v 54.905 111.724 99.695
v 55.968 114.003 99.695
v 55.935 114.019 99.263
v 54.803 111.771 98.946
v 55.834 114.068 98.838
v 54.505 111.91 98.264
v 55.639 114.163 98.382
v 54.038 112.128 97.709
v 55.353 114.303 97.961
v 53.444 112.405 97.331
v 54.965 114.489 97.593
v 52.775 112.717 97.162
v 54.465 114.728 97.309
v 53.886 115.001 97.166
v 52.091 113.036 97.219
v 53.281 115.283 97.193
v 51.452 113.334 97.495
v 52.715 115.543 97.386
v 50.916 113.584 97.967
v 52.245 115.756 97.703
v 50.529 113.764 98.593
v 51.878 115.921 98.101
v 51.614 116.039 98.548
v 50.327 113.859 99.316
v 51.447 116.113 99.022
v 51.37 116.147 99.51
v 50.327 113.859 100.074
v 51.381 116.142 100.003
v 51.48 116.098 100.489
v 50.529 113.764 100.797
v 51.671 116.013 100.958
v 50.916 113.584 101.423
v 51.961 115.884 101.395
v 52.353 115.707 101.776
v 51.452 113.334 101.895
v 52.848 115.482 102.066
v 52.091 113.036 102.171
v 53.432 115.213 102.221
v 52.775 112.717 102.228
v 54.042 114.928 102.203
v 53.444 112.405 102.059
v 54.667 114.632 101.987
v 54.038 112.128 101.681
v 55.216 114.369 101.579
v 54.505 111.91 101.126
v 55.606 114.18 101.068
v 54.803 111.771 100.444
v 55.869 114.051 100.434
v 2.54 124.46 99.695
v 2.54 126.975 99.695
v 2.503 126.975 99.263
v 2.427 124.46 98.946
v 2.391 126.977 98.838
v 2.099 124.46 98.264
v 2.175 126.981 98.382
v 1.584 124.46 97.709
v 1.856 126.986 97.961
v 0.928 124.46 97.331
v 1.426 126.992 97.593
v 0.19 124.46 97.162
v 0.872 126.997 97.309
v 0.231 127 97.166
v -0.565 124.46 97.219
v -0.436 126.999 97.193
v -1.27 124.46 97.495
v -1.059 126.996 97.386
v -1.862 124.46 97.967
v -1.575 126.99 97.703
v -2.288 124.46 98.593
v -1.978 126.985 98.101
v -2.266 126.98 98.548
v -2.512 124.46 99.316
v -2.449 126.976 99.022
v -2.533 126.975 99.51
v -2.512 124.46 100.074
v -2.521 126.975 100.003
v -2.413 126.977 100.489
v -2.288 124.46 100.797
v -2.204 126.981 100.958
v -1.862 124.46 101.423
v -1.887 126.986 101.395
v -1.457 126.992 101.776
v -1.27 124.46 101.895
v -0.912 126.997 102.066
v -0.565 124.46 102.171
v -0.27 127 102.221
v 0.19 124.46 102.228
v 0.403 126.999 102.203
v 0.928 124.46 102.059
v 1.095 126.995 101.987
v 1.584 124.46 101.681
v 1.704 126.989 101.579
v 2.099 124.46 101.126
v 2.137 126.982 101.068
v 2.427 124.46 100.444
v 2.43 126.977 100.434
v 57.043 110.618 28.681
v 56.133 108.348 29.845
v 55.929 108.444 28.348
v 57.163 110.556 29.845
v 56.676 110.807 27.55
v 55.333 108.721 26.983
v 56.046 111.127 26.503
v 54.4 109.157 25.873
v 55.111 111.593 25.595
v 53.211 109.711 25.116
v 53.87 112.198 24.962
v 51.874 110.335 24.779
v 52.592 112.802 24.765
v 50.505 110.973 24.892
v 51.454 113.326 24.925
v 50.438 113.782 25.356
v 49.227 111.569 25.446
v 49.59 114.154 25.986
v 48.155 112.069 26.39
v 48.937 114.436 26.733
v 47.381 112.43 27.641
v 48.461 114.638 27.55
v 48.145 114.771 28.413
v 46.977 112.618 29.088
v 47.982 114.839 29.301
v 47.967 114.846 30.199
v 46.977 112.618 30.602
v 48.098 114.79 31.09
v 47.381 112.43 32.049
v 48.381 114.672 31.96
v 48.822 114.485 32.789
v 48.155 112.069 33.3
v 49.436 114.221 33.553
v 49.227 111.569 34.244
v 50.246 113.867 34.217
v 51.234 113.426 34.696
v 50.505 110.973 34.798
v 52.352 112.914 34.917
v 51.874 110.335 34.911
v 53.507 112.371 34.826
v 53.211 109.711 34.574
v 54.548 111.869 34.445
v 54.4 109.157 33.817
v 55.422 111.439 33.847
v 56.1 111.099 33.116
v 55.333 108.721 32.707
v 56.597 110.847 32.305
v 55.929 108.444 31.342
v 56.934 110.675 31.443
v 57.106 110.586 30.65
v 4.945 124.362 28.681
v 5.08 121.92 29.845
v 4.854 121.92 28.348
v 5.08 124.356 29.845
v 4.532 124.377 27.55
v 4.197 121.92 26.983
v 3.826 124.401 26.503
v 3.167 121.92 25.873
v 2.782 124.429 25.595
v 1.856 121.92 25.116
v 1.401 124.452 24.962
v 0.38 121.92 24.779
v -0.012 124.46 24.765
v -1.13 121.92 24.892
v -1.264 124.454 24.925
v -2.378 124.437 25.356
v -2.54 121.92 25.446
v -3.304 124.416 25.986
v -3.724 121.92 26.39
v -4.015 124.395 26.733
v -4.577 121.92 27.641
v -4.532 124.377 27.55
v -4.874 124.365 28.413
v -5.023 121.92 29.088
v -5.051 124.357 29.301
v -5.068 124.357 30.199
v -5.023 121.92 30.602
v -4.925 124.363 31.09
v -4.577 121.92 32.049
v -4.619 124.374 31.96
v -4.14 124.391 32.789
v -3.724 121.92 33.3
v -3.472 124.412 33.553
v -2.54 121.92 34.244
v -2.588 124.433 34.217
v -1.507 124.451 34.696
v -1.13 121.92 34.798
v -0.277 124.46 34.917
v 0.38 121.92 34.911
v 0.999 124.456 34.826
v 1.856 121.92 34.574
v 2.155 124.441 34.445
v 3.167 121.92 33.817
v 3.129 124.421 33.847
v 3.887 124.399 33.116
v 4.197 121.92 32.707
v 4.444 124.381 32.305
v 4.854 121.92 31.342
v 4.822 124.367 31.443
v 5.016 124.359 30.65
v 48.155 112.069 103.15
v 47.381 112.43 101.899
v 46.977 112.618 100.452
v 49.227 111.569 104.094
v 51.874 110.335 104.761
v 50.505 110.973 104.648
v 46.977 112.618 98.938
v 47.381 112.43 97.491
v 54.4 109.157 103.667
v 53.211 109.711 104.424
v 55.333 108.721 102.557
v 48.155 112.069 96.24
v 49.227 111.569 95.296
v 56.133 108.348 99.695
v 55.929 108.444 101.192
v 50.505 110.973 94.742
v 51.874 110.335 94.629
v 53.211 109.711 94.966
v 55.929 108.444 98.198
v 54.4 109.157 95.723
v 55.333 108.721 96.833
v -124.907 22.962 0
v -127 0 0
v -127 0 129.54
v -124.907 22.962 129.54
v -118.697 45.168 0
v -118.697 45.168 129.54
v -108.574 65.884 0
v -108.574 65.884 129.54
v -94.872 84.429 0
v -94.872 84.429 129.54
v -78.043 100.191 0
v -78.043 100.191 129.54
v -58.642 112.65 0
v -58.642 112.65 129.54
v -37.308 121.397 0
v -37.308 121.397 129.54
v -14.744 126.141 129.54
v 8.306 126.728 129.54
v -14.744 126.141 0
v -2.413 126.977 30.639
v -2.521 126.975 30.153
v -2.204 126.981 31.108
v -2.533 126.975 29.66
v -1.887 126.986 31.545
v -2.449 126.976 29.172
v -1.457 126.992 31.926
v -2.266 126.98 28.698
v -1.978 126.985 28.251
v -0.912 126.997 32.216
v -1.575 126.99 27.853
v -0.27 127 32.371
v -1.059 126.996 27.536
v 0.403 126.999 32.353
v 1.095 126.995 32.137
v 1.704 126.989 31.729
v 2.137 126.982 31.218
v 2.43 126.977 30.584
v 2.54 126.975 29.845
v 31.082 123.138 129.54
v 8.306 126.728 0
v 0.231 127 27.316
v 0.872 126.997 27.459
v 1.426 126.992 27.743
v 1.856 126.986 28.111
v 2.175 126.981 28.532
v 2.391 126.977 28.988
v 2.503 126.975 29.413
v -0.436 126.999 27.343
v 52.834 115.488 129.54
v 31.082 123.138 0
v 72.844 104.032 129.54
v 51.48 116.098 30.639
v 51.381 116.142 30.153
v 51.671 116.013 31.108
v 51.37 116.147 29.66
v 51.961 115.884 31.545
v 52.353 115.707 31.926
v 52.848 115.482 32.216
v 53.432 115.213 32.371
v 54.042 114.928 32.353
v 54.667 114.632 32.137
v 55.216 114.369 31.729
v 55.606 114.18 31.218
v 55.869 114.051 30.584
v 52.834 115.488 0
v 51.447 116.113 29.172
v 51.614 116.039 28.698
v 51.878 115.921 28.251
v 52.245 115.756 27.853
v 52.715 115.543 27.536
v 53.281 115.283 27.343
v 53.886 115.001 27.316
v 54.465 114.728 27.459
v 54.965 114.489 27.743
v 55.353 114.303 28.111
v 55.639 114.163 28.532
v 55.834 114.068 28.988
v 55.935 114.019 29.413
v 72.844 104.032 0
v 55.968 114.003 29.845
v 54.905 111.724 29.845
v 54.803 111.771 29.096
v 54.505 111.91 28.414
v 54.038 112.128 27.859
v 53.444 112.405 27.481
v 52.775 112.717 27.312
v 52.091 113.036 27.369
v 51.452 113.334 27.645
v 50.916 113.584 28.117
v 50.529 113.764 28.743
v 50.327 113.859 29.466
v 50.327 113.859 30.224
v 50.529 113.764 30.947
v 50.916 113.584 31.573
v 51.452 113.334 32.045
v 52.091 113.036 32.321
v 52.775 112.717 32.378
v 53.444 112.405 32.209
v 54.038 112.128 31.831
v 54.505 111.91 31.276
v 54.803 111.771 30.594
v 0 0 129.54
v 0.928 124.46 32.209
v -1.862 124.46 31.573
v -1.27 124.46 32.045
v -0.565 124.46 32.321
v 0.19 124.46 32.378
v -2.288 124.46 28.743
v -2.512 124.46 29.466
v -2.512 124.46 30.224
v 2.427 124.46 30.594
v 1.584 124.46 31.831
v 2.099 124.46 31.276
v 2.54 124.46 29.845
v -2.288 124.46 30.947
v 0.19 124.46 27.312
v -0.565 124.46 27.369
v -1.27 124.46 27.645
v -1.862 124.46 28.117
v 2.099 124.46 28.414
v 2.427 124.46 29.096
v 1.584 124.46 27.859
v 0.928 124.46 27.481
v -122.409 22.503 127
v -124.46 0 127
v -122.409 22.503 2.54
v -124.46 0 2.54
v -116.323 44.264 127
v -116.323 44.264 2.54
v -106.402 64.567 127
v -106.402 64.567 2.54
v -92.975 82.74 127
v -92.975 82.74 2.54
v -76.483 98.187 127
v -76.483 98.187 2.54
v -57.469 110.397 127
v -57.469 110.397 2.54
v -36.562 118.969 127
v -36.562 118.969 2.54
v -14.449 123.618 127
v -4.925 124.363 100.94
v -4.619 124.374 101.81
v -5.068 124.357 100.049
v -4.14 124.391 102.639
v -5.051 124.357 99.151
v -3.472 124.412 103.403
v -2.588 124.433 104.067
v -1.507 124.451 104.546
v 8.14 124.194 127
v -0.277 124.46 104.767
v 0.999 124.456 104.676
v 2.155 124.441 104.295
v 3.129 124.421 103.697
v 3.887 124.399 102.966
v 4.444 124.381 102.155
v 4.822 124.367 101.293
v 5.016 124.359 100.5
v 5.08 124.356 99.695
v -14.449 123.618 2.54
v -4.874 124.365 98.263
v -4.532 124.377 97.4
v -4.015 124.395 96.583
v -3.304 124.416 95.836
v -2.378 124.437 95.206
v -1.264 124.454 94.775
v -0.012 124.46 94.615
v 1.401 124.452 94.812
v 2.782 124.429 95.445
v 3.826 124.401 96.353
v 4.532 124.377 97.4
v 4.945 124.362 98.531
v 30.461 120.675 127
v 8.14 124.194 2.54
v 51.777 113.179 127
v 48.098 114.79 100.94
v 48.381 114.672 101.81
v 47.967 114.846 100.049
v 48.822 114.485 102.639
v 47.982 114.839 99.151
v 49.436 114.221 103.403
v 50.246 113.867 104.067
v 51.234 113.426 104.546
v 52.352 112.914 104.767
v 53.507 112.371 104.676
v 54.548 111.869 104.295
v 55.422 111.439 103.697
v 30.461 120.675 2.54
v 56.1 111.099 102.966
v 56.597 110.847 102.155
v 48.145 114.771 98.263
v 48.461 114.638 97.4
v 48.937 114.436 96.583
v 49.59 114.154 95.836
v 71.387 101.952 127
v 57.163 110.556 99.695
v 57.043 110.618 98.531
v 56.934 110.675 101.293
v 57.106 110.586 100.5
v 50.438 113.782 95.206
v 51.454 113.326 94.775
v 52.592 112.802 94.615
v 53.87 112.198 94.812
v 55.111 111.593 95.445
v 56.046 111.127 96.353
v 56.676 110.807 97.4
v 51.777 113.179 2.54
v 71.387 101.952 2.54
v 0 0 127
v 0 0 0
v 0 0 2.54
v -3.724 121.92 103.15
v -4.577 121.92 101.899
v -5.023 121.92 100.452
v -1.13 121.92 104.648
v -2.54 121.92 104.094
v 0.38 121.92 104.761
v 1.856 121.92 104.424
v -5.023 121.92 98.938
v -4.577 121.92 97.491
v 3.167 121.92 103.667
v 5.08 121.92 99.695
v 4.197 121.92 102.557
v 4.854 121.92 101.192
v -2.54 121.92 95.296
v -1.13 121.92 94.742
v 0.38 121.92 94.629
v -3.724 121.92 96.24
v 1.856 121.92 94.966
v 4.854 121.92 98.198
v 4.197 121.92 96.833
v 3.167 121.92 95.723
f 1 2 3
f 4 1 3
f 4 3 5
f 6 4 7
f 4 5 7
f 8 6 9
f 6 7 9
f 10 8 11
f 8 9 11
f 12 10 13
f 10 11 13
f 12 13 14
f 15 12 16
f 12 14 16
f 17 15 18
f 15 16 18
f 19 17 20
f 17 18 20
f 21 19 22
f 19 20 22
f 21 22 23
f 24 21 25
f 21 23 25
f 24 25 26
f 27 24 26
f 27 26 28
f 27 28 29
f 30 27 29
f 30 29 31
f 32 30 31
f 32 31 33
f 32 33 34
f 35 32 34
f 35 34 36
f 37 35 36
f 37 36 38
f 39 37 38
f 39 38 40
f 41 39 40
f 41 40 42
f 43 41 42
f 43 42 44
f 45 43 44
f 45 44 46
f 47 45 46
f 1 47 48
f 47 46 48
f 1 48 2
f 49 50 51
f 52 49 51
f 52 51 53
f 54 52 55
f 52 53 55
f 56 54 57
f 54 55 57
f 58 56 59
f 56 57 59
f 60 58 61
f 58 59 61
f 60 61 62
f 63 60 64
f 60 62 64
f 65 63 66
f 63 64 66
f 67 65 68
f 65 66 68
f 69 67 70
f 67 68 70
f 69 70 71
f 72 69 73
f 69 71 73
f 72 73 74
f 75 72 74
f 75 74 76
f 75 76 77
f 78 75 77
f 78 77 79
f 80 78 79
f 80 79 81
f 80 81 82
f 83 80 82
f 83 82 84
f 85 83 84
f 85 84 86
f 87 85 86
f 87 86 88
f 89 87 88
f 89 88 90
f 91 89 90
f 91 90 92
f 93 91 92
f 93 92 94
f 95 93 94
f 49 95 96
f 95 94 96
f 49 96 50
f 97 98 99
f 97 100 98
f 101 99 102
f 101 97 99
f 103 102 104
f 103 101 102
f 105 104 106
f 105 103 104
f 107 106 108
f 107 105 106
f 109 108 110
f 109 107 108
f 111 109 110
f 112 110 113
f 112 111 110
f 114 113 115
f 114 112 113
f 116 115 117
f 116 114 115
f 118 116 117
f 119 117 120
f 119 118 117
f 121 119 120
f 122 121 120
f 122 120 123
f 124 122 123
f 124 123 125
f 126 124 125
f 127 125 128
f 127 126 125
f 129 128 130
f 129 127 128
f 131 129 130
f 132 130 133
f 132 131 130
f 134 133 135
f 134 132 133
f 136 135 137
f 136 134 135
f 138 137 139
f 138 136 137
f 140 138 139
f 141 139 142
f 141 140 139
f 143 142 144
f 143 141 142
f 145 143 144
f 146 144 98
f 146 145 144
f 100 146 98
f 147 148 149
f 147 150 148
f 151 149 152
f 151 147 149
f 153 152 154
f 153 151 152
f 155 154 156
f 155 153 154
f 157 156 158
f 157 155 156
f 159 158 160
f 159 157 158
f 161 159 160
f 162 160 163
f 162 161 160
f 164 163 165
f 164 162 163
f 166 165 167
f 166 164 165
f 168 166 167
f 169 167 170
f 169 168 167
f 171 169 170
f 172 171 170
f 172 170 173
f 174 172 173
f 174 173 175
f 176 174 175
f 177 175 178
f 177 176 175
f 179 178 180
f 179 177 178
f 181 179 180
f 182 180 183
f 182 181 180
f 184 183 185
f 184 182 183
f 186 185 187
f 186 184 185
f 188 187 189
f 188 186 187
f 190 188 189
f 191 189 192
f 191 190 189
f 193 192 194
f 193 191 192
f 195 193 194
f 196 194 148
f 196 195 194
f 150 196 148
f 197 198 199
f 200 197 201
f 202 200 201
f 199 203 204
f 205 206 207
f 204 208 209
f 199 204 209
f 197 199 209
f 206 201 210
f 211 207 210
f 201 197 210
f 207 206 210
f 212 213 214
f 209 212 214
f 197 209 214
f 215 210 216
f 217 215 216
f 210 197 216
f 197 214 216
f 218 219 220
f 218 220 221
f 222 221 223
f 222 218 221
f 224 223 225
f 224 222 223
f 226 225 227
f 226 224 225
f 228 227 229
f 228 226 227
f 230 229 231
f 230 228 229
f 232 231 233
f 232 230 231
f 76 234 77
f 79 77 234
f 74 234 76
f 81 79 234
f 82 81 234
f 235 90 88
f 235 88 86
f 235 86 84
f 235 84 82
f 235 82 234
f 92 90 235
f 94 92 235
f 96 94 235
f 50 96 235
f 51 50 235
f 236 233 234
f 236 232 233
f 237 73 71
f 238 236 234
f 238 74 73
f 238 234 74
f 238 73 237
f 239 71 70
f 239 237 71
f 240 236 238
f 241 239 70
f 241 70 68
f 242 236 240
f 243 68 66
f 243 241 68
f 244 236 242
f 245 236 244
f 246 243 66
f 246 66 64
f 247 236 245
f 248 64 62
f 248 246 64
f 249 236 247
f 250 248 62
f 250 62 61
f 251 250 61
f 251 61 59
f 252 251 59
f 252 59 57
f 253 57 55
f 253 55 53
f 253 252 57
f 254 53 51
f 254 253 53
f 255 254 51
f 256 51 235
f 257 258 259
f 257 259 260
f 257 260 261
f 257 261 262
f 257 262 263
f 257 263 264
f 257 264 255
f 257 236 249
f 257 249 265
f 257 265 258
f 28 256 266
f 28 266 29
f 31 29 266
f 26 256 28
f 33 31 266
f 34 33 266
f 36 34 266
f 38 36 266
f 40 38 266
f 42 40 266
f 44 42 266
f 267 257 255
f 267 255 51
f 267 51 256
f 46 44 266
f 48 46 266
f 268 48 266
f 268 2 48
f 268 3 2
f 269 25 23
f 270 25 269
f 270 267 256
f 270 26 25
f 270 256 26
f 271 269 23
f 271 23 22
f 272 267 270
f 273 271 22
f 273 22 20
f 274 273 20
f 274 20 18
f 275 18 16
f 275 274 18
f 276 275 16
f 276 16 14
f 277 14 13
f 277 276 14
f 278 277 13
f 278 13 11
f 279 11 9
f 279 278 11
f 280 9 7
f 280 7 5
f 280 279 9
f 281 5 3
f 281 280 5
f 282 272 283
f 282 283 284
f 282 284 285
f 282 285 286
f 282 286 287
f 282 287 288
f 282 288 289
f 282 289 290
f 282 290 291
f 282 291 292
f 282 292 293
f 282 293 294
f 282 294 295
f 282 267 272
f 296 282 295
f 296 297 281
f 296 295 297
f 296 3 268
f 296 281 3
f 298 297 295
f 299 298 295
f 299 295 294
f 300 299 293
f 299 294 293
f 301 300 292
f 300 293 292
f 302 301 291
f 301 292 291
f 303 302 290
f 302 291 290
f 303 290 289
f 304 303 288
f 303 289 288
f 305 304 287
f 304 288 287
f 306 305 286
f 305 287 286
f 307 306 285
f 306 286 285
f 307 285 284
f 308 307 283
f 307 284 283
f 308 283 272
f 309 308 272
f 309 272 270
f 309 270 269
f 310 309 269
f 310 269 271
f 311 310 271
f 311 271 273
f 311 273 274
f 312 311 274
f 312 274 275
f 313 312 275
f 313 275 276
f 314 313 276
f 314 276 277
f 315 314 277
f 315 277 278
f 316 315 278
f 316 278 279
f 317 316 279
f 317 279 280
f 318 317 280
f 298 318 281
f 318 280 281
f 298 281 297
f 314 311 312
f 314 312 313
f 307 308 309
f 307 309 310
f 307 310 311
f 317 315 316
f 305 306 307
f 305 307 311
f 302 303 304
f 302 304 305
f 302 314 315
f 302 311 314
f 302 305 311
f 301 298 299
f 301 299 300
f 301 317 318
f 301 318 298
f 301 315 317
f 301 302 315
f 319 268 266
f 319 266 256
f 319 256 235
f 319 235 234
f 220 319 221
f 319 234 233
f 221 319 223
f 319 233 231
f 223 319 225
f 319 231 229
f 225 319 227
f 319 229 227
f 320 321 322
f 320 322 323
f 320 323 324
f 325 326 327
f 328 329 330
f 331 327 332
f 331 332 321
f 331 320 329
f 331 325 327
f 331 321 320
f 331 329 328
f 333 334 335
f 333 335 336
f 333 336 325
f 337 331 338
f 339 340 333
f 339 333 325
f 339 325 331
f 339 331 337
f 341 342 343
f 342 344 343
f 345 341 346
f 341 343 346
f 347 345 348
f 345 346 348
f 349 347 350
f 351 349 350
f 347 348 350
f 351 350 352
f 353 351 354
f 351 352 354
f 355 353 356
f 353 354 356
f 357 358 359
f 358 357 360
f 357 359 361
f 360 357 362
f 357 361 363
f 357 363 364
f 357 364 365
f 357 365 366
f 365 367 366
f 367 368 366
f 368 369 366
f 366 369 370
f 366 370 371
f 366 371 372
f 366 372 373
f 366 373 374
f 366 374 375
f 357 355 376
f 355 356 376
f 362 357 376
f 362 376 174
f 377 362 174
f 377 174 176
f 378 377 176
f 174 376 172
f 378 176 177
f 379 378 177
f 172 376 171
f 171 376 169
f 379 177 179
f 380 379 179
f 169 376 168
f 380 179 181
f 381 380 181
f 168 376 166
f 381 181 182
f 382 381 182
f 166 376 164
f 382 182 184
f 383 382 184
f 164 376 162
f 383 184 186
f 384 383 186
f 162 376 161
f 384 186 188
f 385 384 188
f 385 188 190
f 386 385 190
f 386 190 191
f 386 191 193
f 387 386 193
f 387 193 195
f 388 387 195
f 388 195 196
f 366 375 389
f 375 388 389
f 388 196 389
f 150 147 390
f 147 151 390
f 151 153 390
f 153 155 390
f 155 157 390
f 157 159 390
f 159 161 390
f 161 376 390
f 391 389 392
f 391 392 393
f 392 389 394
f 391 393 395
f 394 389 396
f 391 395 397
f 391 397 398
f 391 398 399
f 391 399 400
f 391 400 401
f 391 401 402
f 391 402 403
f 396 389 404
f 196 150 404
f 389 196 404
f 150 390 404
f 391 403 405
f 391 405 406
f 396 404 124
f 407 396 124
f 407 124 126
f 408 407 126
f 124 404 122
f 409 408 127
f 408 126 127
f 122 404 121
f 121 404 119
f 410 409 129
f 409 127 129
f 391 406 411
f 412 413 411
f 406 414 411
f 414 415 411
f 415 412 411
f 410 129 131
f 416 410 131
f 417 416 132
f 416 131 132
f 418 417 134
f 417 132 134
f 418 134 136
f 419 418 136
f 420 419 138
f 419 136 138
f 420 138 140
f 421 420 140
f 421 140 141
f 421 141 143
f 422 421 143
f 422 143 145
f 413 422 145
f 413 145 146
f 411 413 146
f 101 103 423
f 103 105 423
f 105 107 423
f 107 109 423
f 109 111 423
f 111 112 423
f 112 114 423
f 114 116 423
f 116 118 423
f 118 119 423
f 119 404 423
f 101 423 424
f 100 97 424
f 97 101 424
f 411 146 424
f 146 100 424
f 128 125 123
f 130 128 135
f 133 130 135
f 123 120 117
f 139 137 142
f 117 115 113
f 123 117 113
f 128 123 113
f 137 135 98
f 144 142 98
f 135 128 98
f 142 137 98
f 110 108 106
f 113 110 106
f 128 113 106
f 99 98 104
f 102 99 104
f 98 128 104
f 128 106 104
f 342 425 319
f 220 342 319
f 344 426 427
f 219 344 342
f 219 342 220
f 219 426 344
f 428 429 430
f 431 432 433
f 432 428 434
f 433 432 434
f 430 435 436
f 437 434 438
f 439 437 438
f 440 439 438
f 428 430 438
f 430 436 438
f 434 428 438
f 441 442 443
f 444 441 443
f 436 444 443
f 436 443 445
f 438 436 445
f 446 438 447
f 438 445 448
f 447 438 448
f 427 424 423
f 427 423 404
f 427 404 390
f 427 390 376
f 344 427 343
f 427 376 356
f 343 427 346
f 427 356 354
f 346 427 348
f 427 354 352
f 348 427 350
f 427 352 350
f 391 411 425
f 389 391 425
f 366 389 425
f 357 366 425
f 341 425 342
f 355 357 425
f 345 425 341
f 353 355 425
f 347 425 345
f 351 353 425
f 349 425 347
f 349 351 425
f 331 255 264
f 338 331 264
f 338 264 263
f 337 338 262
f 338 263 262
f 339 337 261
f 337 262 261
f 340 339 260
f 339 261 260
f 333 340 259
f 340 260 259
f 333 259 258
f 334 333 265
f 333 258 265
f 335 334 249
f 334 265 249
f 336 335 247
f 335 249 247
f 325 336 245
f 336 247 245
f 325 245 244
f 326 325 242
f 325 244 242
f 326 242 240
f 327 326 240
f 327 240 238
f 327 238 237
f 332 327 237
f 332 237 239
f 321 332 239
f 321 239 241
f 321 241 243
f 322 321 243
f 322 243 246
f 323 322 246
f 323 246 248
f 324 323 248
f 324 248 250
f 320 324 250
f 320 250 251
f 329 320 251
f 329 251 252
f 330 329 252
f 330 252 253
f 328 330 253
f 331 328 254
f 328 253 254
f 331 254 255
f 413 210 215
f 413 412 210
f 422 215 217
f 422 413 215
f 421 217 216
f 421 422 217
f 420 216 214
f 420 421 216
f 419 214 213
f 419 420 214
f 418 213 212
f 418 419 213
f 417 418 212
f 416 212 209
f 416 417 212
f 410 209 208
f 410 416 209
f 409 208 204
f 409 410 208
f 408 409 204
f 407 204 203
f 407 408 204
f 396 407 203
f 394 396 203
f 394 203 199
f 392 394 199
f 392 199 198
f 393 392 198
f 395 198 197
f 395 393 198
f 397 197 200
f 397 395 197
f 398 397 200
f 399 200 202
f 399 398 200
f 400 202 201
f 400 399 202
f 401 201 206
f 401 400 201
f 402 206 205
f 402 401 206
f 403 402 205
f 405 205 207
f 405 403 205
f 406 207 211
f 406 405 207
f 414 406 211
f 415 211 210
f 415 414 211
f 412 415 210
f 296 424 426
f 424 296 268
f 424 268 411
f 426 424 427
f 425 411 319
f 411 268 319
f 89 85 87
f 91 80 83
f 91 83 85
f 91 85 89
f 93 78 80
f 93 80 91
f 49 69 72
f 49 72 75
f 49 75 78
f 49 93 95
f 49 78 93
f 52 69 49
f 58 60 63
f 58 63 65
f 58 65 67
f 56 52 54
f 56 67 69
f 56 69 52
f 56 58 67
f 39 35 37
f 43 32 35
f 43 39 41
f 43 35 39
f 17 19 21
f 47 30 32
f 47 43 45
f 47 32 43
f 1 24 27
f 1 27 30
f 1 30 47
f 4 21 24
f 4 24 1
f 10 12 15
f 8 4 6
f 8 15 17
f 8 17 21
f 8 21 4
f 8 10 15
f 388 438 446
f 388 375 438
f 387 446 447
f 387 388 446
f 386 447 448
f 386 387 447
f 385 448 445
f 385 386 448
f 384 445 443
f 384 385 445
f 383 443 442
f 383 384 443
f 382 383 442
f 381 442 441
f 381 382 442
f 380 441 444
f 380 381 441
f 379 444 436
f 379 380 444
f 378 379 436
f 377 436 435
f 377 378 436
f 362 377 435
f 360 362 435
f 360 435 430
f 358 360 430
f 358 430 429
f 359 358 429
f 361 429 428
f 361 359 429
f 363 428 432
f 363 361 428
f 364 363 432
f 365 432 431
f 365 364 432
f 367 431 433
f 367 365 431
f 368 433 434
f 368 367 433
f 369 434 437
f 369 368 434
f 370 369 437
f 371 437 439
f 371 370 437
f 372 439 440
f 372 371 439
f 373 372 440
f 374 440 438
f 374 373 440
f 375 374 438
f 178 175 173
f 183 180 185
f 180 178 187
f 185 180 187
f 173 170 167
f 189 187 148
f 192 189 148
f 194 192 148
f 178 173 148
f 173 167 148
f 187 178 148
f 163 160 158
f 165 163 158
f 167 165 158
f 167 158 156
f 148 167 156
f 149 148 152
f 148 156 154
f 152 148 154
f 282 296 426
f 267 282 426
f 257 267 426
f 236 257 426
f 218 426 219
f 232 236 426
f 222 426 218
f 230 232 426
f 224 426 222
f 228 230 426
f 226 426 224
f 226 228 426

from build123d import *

# Parameters (mm, degrees)
BOSS_EXTRUDE1_DEPTH = 129.54
SKETCH2_R           = 2.54
CUT_EXTRUDE1_DEPTH  = 2.54
SKETCH4_R           = 2.54
CUT_EXTRUDE2_DEPTH  = 2.54
CUT_EXTRUDE3_DEPTH  = 130.5400001
SHELL1_T            = -2.54


with BuildPart() as part:
    # Sketch1 → Boss-Extrude1 (new body)
    with BuildSketch(Plane.XY):
        with BuildLine():
            Line((127, 0), (0, 0))
            Line((0, 0), (-127, 0))
            ThreePointArc((-127, 0), (0, 127), (127, 0))
        make_face()
    extrude(amount=BOSS_EXTRUDE1_DEPTH)

    # Sketch2 → Cut-Extrude1 (cut)
    with BuildSketch(Plane(origin=(0, 127, 129.54), x_dir=(1, 0, 0), z_dir=(0, 1, 0))):
        with Locations((0, 29.845)):
            Circle(SKETCH2_R)
        with Locations((0, 99.695)):
            Circle(SKETCH2_R)
    extrude(amount=-CUT_EXTRUDE1_DEPTH, mode=Mode.SUBTRACT)

    # Sketch4 → Cut-Extrude2 (cut)
    with BuildSketch(Plane(origin=(53.676536994, 115.099215359, 129.54), x_dir=(0.906293034, -0.422649898, 0), z_dir=(0.422649898, 0.906293034, 0))):
        with Locations((0, 29.845)):
            Circle(SKETCH4_R)
        with Locations((0, 99.695)):
            Circle(SKETCH4_R)
    extrude(amount=-CUT_EXTRUDE2_DEPTH, mode=Mode.SUBTRACT)

    # Sketch5 → Cut-Extrude3 (cut, through all)
    with BuildSketch(Plane.XY.offset(129.54)):
        with BuildLine():
            Line((72.844207417, 104.032309625), (0, 0))
            Line((0, 0), (127, 0))
            ThreePointArc((127, 0), (112.650375814, 58.642073881), (72.844207417, 104.032309625))
        make_face()
    extrude(amount=-CUT_EXTRUDE3_DEPTH, mode=Mode.SUBTRACT)

    # Shell1
    shell1_openings = [part.faces().sort_by_distance(p)[0] for p in [
        (-63.5, 0, 64.77),
        (36.422103708, 52.016154812, 64.77),
    ]]
    offset(amount=SHELL1_T, openings=shell1_openings, kind=Kind.INTERSECTION)


solid = part.part
